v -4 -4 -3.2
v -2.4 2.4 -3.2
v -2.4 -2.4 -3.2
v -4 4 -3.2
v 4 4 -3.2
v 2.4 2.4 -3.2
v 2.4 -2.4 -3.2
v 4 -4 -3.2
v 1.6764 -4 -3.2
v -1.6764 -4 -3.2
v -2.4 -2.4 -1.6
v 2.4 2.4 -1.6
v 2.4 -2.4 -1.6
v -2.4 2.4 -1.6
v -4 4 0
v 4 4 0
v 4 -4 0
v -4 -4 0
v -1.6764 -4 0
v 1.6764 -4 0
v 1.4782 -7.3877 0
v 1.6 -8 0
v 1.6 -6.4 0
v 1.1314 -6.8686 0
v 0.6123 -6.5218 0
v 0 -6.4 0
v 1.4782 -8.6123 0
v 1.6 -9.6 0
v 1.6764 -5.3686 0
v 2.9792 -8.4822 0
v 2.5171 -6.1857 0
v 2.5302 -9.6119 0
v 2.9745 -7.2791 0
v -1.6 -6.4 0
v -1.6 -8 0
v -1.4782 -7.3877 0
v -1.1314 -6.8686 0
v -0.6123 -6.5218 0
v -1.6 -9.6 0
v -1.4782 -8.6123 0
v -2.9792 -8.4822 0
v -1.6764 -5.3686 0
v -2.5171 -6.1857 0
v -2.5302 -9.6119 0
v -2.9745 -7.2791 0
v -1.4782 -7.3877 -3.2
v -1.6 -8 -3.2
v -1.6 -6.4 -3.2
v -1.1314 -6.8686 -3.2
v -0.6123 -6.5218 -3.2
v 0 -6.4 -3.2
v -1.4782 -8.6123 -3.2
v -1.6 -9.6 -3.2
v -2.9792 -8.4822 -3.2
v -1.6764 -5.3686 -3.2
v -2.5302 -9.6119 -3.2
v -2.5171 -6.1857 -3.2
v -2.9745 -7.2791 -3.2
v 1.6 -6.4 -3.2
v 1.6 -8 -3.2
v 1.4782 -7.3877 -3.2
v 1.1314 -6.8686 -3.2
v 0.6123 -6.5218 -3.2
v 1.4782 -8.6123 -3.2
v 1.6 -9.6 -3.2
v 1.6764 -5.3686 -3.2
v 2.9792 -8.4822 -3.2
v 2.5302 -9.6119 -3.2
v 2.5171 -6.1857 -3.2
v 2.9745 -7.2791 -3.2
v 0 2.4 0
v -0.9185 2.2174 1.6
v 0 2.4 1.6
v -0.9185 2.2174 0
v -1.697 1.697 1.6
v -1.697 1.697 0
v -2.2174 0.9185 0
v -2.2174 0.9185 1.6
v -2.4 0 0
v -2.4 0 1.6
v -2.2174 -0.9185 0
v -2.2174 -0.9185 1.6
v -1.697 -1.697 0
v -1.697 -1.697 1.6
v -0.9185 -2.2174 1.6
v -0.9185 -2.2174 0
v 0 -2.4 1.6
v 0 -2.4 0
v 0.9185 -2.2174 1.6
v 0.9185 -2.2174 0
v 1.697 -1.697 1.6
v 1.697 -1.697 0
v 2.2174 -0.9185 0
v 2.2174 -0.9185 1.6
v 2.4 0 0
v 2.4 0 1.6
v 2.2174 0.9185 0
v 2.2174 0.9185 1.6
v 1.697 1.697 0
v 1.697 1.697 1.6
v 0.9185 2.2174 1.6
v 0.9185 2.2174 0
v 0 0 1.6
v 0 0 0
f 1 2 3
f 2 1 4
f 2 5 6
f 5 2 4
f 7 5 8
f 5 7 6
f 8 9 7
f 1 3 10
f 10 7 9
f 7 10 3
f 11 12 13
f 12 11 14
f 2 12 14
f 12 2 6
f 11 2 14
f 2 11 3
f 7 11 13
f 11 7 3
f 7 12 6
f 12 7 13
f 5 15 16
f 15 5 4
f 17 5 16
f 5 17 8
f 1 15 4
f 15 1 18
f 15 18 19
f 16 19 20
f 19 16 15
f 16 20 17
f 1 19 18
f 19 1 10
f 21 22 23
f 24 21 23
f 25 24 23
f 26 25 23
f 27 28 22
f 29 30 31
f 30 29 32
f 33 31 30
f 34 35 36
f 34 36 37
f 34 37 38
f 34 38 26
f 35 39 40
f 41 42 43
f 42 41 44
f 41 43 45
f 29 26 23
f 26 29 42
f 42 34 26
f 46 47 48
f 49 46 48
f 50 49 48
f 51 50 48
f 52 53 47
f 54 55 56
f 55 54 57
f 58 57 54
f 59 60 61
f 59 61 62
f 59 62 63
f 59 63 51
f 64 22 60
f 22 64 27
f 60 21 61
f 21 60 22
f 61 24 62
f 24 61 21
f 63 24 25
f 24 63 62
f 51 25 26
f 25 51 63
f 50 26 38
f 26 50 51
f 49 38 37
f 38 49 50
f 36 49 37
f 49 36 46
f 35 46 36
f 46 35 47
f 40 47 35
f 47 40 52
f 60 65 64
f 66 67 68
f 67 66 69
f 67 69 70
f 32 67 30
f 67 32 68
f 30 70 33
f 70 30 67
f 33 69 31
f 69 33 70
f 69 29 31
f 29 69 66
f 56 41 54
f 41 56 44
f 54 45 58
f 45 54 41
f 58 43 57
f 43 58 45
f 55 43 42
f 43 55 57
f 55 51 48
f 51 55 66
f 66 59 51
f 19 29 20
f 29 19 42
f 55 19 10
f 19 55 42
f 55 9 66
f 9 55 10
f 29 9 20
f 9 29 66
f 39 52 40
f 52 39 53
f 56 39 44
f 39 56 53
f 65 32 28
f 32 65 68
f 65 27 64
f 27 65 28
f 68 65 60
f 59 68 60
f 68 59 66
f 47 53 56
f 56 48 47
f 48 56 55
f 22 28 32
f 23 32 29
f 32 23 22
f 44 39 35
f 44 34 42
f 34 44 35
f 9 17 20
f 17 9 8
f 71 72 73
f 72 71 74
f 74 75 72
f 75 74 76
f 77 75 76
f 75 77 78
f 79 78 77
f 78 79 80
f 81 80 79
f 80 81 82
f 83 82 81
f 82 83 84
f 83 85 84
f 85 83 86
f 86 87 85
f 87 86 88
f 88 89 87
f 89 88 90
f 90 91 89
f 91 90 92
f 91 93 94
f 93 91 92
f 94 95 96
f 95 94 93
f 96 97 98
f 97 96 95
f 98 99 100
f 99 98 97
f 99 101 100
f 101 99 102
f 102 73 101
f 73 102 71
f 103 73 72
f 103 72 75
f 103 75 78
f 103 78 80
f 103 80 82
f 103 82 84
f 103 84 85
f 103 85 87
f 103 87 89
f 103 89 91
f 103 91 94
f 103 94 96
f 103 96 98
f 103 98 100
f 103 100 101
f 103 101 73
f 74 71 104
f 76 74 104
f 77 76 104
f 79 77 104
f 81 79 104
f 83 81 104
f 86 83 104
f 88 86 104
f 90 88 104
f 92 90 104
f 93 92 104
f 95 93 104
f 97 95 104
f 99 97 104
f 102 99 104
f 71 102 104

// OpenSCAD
use <../lib.scad>
use <../p/box3u2p.scad>
use <../p/box5.scad>
use <../p/clip5.scad>
use <../p/rect3.scad>
use <../p/stud.scad>
function ldraw_lib__60897() = [
// 0 Plate  1 x  1 with Clip Vertical (Thick C-Clip)
// 0 Name: 60897.dat
// 0 Author: Owen Burgoyne [C3POwen]
// 0 !LDRAW_ORG Part UPDATE 2013-02
// 0 !LICENSE Licensed under CC BY 4.0 : see CAreadme.txt
// 
// 0 BFC CERTIFY CCW
  [0,"BFC","CERTIFY"],
  [0,"BFC","CCW"],
// 
// 0 !HISTORY 2013-12-23 [PTadmin] Official Update 2013-02
// 
// 
// 4 16 -10 8 -10 -10 8 10 -6 8 6 -6 8 -6
  [4,16,-10,8,-10,-10,8,10,-6,8,6,-6,8,-6],
// 4 16 -10 8 10 10 8 10 6 8 6 -6 8 6
  [4,16,-10,8,10,10,8,10,6,8,6,-6,8,6],
// 4 16 10 8 10 10 8 -10 6 8 -6 6 8 6
  [4,16,10,8,10,10,8,-10,6,8,-6,6,8,6],
// 3 16 10 8 -10 4.1909 8 -10 6 8 -6
  [3,16,10,8,-10,4.1909,8,-10,6,8,-6],
// 3 16 -10 8 -10 -6 8 -6 -4.1909 8 -10
  [3,16,-10,8,-10,-6,8,-6,-4.1909,8,-10],
// 4 16 4.1909 8 -10 -4.1909 8 -10 -6 8 -6 6 8 -6
  [4,16,4.1909,8,-10,-4.1909,8,-10,-6,8,-6,6,8,-6],
// 0 BFC INVERTNEXT
  [0,"BFC","INVERTNEXT"],
// 1 16 0 8 0 6 0 0 0 -4 0 0 0 6 box5.dat
  [1,16,0,8,0,6,0,0,0,-4,0,0,0,6, ldraw_lib__box5()],
// 1 16 0 4 -10 0 0 10 4 0 0 0 20 0 box3u2p.dat
  [1,16,0,4,-10,0,0,10,4,0,0,0,20,0, ldraw_lib__box3u2p()],
// 3 16 -10 0 10 -10 0 -10 -4.1909 0 -10
  [3,16,-10,0,10,-10,0,-10,-4.1909,0,-10],
// 4 16 -10 0 10 -4.1909 0 -10 4.1909 0 -10 10 0 10
  [4,16,-10,0,10,-4.1909,0,-10,4.1909,0,-10,10,0,10],
// 3 16 10 0 10 4.1909 0 -10 10 0 -10
  [3,16,10,0,10,4.1909,0,-10,10,0,-10],
// 1 16 -7.09545 4 -10 0 0 2.90455 4 0 0 0 1 0 rect3.dat
  [1,16,-7.09545,4,-10,0,0,2.90455,4,0,0,0,1,0, ldraw_lib__rect3()],
// 1 16 0 4 -20 1 0 0 0 1 0 0 0 1 clip5.dat
  [1,16,0,4,-20,1,0,0,0,1,0,0,0,1, ldraw_lib__clip5()],
// 1 16 7.09545 4 -10 0 0 -2.90455 -4 0 0 0 1 0 rect3.dat
  [1,16,7.09545,4,-10,0,0,-2.90455,-4,0,0,0,1,0, ldraw_lib__rect3()],
// 1 16 0 0 0 0 0 -1 0 1 0 1 0 0 stud.dat
  [1,16,0,0,0,0,0,-1,0,1,0,1,0,0, ldraw_lib__stud()],
];
module ldraw_lib__60897(step=0, col=false, unit=2/5, alt=false, line=0.2, solid=!$preview)
    makepoly(ldraw_lib__60897(), step=step, col=col, unit=unit, alt=alt, line=line, solid=solid);
ldraw_lib__60897(line=0.2);
